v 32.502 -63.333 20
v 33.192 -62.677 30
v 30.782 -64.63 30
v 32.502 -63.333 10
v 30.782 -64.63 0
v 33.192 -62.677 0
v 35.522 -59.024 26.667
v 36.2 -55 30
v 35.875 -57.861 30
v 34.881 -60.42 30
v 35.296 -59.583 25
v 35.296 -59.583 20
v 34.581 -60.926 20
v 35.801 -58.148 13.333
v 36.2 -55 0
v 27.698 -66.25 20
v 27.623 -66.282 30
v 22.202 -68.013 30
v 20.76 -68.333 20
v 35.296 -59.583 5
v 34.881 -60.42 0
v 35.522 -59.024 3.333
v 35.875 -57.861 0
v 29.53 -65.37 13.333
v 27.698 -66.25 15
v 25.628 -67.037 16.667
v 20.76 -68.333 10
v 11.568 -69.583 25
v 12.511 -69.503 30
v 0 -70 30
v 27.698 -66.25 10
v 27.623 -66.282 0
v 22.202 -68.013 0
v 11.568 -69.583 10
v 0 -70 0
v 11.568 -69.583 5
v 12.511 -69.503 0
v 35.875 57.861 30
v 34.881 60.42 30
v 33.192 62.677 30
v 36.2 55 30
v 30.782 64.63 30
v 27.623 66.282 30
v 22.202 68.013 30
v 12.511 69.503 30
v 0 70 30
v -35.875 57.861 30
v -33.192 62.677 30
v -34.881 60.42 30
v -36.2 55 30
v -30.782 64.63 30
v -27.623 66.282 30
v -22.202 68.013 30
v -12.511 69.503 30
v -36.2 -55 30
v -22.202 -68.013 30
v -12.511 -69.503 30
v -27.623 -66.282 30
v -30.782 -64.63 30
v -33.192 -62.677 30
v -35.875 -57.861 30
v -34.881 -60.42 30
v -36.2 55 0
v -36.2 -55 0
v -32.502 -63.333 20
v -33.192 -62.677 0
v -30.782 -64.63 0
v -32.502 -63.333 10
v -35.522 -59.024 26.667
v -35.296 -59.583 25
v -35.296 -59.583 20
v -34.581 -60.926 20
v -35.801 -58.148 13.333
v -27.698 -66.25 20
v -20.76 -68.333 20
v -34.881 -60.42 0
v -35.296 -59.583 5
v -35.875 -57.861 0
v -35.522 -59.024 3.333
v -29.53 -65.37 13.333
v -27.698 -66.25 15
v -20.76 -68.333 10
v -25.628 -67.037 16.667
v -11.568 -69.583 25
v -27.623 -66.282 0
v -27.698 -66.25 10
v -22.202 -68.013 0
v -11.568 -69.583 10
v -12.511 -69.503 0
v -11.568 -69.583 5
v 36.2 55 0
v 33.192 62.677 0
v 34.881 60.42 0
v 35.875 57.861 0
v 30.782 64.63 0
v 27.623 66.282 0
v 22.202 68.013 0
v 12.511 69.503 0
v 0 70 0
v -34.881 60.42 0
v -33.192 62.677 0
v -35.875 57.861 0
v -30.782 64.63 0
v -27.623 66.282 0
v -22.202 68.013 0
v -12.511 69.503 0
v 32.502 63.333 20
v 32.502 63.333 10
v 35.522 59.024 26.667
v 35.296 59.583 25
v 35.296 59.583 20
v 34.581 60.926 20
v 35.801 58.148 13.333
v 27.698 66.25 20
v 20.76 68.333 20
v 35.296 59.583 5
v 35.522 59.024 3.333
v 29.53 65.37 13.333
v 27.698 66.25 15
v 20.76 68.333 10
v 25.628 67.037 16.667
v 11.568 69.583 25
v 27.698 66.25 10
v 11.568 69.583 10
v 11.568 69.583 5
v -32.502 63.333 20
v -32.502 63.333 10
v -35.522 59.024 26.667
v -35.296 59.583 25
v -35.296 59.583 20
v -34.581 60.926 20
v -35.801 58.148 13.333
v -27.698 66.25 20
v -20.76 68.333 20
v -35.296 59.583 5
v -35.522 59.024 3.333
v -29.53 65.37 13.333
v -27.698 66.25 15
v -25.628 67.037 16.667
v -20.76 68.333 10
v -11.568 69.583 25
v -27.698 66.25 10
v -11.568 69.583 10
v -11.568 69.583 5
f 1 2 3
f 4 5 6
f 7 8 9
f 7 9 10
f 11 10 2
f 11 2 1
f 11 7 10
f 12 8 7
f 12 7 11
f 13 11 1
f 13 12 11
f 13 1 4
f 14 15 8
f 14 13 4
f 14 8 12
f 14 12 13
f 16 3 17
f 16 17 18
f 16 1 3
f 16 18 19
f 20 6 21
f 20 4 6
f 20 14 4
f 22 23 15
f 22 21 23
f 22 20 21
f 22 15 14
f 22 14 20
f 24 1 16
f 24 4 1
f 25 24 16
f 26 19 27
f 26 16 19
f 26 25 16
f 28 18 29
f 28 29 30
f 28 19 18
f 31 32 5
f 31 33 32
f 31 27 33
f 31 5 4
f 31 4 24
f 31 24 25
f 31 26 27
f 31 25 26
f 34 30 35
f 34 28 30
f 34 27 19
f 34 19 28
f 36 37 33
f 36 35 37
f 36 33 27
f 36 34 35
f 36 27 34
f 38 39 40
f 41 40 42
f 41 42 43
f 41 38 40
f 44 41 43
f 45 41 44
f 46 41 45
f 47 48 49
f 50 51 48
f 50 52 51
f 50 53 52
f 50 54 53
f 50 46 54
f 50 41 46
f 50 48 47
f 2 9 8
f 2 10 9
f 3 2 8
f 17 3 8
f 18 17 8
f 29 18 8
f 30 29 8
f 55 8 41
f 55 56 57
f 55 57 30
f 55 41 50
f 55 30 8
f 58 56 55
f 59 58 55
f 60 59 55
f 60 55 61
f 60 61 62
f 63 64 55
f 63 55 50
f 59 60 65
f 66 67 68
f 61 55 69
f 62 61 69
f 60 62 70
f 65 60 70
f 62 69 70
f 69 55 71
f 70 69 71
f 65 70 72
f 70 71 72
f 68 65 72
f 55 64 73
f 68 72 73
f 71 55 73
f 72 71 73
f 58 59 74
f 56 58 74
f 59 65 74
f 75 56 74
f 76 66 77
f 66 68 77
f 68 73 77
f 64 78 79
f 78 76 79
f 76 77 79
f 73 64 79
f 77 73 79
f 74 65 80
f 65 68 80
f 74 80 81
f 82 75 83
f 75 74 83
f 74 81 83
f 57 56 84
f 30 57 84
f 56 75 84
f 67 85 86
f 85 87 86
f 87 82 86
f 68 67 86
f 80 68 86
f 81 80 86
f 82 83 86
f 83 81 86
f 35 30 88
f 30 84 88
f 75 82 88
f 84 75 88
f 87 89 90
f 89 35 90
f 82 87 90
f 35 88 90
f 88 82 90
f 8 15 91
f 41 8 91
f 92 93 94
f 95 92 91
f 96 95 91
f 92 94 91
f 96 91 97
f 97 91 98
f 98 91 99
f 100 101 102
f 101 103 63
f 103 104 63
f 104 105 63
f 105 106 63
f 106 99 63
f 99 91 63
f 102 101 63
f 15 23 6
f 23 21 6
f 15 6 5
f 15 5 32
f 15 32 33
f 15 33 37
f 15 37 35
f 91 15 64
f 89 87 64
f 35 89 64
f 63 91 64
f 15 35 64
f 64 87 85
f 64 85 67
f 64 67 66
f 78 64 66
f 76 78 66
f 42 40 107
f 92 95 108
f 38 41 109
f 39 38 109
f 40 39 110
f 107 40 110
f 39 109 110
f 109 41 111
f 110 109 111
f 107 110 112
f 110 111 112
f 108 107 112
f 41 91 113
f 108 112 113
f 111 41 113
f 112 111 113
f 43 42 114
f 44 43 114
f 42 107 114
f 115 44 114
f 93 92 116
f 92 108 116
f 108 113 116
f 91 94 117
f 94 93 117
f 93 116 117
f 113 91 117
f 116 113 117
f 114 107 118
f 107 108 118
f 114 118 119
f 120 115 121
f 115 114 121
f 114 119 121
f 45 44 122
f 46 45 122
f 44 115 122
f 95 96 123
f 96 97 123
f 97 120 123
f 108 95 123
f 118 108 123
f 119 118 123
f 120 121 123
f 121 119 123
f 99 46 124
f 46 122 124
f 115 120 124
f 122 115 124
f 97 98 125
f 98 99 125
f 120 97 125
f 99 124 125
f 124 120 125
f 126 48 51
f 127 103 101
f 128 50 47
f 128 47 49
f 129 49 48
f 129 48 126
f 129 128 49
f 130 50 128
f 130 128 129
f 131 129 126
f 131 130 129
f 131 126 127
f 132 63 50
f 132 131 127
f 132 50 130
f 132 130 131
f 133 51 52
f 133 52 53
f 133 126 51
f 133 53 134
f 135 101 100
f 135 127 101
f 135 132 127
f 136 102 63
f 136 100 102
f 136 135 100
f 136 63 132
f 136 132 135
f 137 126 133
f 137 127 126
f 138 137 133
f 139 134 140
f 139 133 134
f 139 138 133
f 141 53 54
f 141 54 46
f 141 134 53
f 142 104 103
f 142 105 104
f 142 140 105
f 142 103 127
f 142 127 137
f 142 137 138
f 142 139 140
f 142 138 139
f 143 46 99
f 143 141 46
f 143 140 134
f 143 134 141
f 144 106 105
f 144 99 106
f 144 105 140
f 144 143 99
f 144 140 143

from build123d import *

# Parameters (mm, degrees)
F1_DEPTH = 30


with BuildPart() as f1:
    # F0 (on Top) → F1 (new body)
    with BuildSketch(Plane.XY):
        with BuildLine():
            Line((-36.2, 55), (-36.2, 0))
            Line((-36.2, 0), (0, 0))
            Line((0, 0), (0, 70))
            add(Edge.make_bspline(
                [(-36.2, 55), (-36.2, 65), (-25.5934, 70), (0, 70)],
                knots=[0, 0, 0, 0, 39.184691, 39.184691, 39.184691, 39.184691], degree=3))
        make_face()
    extrude(amount=F1_DEPTH)

    # F2: F1 across plane


with BuildPart() as f1_1:
    add(f1.part)
    add(f1.part.mirror(Plane.YZ))

    # F3: F1 across plane


with BuildPart() as f1_2:
    add(f1_1.part)
    add(f1_1.part.mirror(Plane.XZ))


solid = f1_2.part
